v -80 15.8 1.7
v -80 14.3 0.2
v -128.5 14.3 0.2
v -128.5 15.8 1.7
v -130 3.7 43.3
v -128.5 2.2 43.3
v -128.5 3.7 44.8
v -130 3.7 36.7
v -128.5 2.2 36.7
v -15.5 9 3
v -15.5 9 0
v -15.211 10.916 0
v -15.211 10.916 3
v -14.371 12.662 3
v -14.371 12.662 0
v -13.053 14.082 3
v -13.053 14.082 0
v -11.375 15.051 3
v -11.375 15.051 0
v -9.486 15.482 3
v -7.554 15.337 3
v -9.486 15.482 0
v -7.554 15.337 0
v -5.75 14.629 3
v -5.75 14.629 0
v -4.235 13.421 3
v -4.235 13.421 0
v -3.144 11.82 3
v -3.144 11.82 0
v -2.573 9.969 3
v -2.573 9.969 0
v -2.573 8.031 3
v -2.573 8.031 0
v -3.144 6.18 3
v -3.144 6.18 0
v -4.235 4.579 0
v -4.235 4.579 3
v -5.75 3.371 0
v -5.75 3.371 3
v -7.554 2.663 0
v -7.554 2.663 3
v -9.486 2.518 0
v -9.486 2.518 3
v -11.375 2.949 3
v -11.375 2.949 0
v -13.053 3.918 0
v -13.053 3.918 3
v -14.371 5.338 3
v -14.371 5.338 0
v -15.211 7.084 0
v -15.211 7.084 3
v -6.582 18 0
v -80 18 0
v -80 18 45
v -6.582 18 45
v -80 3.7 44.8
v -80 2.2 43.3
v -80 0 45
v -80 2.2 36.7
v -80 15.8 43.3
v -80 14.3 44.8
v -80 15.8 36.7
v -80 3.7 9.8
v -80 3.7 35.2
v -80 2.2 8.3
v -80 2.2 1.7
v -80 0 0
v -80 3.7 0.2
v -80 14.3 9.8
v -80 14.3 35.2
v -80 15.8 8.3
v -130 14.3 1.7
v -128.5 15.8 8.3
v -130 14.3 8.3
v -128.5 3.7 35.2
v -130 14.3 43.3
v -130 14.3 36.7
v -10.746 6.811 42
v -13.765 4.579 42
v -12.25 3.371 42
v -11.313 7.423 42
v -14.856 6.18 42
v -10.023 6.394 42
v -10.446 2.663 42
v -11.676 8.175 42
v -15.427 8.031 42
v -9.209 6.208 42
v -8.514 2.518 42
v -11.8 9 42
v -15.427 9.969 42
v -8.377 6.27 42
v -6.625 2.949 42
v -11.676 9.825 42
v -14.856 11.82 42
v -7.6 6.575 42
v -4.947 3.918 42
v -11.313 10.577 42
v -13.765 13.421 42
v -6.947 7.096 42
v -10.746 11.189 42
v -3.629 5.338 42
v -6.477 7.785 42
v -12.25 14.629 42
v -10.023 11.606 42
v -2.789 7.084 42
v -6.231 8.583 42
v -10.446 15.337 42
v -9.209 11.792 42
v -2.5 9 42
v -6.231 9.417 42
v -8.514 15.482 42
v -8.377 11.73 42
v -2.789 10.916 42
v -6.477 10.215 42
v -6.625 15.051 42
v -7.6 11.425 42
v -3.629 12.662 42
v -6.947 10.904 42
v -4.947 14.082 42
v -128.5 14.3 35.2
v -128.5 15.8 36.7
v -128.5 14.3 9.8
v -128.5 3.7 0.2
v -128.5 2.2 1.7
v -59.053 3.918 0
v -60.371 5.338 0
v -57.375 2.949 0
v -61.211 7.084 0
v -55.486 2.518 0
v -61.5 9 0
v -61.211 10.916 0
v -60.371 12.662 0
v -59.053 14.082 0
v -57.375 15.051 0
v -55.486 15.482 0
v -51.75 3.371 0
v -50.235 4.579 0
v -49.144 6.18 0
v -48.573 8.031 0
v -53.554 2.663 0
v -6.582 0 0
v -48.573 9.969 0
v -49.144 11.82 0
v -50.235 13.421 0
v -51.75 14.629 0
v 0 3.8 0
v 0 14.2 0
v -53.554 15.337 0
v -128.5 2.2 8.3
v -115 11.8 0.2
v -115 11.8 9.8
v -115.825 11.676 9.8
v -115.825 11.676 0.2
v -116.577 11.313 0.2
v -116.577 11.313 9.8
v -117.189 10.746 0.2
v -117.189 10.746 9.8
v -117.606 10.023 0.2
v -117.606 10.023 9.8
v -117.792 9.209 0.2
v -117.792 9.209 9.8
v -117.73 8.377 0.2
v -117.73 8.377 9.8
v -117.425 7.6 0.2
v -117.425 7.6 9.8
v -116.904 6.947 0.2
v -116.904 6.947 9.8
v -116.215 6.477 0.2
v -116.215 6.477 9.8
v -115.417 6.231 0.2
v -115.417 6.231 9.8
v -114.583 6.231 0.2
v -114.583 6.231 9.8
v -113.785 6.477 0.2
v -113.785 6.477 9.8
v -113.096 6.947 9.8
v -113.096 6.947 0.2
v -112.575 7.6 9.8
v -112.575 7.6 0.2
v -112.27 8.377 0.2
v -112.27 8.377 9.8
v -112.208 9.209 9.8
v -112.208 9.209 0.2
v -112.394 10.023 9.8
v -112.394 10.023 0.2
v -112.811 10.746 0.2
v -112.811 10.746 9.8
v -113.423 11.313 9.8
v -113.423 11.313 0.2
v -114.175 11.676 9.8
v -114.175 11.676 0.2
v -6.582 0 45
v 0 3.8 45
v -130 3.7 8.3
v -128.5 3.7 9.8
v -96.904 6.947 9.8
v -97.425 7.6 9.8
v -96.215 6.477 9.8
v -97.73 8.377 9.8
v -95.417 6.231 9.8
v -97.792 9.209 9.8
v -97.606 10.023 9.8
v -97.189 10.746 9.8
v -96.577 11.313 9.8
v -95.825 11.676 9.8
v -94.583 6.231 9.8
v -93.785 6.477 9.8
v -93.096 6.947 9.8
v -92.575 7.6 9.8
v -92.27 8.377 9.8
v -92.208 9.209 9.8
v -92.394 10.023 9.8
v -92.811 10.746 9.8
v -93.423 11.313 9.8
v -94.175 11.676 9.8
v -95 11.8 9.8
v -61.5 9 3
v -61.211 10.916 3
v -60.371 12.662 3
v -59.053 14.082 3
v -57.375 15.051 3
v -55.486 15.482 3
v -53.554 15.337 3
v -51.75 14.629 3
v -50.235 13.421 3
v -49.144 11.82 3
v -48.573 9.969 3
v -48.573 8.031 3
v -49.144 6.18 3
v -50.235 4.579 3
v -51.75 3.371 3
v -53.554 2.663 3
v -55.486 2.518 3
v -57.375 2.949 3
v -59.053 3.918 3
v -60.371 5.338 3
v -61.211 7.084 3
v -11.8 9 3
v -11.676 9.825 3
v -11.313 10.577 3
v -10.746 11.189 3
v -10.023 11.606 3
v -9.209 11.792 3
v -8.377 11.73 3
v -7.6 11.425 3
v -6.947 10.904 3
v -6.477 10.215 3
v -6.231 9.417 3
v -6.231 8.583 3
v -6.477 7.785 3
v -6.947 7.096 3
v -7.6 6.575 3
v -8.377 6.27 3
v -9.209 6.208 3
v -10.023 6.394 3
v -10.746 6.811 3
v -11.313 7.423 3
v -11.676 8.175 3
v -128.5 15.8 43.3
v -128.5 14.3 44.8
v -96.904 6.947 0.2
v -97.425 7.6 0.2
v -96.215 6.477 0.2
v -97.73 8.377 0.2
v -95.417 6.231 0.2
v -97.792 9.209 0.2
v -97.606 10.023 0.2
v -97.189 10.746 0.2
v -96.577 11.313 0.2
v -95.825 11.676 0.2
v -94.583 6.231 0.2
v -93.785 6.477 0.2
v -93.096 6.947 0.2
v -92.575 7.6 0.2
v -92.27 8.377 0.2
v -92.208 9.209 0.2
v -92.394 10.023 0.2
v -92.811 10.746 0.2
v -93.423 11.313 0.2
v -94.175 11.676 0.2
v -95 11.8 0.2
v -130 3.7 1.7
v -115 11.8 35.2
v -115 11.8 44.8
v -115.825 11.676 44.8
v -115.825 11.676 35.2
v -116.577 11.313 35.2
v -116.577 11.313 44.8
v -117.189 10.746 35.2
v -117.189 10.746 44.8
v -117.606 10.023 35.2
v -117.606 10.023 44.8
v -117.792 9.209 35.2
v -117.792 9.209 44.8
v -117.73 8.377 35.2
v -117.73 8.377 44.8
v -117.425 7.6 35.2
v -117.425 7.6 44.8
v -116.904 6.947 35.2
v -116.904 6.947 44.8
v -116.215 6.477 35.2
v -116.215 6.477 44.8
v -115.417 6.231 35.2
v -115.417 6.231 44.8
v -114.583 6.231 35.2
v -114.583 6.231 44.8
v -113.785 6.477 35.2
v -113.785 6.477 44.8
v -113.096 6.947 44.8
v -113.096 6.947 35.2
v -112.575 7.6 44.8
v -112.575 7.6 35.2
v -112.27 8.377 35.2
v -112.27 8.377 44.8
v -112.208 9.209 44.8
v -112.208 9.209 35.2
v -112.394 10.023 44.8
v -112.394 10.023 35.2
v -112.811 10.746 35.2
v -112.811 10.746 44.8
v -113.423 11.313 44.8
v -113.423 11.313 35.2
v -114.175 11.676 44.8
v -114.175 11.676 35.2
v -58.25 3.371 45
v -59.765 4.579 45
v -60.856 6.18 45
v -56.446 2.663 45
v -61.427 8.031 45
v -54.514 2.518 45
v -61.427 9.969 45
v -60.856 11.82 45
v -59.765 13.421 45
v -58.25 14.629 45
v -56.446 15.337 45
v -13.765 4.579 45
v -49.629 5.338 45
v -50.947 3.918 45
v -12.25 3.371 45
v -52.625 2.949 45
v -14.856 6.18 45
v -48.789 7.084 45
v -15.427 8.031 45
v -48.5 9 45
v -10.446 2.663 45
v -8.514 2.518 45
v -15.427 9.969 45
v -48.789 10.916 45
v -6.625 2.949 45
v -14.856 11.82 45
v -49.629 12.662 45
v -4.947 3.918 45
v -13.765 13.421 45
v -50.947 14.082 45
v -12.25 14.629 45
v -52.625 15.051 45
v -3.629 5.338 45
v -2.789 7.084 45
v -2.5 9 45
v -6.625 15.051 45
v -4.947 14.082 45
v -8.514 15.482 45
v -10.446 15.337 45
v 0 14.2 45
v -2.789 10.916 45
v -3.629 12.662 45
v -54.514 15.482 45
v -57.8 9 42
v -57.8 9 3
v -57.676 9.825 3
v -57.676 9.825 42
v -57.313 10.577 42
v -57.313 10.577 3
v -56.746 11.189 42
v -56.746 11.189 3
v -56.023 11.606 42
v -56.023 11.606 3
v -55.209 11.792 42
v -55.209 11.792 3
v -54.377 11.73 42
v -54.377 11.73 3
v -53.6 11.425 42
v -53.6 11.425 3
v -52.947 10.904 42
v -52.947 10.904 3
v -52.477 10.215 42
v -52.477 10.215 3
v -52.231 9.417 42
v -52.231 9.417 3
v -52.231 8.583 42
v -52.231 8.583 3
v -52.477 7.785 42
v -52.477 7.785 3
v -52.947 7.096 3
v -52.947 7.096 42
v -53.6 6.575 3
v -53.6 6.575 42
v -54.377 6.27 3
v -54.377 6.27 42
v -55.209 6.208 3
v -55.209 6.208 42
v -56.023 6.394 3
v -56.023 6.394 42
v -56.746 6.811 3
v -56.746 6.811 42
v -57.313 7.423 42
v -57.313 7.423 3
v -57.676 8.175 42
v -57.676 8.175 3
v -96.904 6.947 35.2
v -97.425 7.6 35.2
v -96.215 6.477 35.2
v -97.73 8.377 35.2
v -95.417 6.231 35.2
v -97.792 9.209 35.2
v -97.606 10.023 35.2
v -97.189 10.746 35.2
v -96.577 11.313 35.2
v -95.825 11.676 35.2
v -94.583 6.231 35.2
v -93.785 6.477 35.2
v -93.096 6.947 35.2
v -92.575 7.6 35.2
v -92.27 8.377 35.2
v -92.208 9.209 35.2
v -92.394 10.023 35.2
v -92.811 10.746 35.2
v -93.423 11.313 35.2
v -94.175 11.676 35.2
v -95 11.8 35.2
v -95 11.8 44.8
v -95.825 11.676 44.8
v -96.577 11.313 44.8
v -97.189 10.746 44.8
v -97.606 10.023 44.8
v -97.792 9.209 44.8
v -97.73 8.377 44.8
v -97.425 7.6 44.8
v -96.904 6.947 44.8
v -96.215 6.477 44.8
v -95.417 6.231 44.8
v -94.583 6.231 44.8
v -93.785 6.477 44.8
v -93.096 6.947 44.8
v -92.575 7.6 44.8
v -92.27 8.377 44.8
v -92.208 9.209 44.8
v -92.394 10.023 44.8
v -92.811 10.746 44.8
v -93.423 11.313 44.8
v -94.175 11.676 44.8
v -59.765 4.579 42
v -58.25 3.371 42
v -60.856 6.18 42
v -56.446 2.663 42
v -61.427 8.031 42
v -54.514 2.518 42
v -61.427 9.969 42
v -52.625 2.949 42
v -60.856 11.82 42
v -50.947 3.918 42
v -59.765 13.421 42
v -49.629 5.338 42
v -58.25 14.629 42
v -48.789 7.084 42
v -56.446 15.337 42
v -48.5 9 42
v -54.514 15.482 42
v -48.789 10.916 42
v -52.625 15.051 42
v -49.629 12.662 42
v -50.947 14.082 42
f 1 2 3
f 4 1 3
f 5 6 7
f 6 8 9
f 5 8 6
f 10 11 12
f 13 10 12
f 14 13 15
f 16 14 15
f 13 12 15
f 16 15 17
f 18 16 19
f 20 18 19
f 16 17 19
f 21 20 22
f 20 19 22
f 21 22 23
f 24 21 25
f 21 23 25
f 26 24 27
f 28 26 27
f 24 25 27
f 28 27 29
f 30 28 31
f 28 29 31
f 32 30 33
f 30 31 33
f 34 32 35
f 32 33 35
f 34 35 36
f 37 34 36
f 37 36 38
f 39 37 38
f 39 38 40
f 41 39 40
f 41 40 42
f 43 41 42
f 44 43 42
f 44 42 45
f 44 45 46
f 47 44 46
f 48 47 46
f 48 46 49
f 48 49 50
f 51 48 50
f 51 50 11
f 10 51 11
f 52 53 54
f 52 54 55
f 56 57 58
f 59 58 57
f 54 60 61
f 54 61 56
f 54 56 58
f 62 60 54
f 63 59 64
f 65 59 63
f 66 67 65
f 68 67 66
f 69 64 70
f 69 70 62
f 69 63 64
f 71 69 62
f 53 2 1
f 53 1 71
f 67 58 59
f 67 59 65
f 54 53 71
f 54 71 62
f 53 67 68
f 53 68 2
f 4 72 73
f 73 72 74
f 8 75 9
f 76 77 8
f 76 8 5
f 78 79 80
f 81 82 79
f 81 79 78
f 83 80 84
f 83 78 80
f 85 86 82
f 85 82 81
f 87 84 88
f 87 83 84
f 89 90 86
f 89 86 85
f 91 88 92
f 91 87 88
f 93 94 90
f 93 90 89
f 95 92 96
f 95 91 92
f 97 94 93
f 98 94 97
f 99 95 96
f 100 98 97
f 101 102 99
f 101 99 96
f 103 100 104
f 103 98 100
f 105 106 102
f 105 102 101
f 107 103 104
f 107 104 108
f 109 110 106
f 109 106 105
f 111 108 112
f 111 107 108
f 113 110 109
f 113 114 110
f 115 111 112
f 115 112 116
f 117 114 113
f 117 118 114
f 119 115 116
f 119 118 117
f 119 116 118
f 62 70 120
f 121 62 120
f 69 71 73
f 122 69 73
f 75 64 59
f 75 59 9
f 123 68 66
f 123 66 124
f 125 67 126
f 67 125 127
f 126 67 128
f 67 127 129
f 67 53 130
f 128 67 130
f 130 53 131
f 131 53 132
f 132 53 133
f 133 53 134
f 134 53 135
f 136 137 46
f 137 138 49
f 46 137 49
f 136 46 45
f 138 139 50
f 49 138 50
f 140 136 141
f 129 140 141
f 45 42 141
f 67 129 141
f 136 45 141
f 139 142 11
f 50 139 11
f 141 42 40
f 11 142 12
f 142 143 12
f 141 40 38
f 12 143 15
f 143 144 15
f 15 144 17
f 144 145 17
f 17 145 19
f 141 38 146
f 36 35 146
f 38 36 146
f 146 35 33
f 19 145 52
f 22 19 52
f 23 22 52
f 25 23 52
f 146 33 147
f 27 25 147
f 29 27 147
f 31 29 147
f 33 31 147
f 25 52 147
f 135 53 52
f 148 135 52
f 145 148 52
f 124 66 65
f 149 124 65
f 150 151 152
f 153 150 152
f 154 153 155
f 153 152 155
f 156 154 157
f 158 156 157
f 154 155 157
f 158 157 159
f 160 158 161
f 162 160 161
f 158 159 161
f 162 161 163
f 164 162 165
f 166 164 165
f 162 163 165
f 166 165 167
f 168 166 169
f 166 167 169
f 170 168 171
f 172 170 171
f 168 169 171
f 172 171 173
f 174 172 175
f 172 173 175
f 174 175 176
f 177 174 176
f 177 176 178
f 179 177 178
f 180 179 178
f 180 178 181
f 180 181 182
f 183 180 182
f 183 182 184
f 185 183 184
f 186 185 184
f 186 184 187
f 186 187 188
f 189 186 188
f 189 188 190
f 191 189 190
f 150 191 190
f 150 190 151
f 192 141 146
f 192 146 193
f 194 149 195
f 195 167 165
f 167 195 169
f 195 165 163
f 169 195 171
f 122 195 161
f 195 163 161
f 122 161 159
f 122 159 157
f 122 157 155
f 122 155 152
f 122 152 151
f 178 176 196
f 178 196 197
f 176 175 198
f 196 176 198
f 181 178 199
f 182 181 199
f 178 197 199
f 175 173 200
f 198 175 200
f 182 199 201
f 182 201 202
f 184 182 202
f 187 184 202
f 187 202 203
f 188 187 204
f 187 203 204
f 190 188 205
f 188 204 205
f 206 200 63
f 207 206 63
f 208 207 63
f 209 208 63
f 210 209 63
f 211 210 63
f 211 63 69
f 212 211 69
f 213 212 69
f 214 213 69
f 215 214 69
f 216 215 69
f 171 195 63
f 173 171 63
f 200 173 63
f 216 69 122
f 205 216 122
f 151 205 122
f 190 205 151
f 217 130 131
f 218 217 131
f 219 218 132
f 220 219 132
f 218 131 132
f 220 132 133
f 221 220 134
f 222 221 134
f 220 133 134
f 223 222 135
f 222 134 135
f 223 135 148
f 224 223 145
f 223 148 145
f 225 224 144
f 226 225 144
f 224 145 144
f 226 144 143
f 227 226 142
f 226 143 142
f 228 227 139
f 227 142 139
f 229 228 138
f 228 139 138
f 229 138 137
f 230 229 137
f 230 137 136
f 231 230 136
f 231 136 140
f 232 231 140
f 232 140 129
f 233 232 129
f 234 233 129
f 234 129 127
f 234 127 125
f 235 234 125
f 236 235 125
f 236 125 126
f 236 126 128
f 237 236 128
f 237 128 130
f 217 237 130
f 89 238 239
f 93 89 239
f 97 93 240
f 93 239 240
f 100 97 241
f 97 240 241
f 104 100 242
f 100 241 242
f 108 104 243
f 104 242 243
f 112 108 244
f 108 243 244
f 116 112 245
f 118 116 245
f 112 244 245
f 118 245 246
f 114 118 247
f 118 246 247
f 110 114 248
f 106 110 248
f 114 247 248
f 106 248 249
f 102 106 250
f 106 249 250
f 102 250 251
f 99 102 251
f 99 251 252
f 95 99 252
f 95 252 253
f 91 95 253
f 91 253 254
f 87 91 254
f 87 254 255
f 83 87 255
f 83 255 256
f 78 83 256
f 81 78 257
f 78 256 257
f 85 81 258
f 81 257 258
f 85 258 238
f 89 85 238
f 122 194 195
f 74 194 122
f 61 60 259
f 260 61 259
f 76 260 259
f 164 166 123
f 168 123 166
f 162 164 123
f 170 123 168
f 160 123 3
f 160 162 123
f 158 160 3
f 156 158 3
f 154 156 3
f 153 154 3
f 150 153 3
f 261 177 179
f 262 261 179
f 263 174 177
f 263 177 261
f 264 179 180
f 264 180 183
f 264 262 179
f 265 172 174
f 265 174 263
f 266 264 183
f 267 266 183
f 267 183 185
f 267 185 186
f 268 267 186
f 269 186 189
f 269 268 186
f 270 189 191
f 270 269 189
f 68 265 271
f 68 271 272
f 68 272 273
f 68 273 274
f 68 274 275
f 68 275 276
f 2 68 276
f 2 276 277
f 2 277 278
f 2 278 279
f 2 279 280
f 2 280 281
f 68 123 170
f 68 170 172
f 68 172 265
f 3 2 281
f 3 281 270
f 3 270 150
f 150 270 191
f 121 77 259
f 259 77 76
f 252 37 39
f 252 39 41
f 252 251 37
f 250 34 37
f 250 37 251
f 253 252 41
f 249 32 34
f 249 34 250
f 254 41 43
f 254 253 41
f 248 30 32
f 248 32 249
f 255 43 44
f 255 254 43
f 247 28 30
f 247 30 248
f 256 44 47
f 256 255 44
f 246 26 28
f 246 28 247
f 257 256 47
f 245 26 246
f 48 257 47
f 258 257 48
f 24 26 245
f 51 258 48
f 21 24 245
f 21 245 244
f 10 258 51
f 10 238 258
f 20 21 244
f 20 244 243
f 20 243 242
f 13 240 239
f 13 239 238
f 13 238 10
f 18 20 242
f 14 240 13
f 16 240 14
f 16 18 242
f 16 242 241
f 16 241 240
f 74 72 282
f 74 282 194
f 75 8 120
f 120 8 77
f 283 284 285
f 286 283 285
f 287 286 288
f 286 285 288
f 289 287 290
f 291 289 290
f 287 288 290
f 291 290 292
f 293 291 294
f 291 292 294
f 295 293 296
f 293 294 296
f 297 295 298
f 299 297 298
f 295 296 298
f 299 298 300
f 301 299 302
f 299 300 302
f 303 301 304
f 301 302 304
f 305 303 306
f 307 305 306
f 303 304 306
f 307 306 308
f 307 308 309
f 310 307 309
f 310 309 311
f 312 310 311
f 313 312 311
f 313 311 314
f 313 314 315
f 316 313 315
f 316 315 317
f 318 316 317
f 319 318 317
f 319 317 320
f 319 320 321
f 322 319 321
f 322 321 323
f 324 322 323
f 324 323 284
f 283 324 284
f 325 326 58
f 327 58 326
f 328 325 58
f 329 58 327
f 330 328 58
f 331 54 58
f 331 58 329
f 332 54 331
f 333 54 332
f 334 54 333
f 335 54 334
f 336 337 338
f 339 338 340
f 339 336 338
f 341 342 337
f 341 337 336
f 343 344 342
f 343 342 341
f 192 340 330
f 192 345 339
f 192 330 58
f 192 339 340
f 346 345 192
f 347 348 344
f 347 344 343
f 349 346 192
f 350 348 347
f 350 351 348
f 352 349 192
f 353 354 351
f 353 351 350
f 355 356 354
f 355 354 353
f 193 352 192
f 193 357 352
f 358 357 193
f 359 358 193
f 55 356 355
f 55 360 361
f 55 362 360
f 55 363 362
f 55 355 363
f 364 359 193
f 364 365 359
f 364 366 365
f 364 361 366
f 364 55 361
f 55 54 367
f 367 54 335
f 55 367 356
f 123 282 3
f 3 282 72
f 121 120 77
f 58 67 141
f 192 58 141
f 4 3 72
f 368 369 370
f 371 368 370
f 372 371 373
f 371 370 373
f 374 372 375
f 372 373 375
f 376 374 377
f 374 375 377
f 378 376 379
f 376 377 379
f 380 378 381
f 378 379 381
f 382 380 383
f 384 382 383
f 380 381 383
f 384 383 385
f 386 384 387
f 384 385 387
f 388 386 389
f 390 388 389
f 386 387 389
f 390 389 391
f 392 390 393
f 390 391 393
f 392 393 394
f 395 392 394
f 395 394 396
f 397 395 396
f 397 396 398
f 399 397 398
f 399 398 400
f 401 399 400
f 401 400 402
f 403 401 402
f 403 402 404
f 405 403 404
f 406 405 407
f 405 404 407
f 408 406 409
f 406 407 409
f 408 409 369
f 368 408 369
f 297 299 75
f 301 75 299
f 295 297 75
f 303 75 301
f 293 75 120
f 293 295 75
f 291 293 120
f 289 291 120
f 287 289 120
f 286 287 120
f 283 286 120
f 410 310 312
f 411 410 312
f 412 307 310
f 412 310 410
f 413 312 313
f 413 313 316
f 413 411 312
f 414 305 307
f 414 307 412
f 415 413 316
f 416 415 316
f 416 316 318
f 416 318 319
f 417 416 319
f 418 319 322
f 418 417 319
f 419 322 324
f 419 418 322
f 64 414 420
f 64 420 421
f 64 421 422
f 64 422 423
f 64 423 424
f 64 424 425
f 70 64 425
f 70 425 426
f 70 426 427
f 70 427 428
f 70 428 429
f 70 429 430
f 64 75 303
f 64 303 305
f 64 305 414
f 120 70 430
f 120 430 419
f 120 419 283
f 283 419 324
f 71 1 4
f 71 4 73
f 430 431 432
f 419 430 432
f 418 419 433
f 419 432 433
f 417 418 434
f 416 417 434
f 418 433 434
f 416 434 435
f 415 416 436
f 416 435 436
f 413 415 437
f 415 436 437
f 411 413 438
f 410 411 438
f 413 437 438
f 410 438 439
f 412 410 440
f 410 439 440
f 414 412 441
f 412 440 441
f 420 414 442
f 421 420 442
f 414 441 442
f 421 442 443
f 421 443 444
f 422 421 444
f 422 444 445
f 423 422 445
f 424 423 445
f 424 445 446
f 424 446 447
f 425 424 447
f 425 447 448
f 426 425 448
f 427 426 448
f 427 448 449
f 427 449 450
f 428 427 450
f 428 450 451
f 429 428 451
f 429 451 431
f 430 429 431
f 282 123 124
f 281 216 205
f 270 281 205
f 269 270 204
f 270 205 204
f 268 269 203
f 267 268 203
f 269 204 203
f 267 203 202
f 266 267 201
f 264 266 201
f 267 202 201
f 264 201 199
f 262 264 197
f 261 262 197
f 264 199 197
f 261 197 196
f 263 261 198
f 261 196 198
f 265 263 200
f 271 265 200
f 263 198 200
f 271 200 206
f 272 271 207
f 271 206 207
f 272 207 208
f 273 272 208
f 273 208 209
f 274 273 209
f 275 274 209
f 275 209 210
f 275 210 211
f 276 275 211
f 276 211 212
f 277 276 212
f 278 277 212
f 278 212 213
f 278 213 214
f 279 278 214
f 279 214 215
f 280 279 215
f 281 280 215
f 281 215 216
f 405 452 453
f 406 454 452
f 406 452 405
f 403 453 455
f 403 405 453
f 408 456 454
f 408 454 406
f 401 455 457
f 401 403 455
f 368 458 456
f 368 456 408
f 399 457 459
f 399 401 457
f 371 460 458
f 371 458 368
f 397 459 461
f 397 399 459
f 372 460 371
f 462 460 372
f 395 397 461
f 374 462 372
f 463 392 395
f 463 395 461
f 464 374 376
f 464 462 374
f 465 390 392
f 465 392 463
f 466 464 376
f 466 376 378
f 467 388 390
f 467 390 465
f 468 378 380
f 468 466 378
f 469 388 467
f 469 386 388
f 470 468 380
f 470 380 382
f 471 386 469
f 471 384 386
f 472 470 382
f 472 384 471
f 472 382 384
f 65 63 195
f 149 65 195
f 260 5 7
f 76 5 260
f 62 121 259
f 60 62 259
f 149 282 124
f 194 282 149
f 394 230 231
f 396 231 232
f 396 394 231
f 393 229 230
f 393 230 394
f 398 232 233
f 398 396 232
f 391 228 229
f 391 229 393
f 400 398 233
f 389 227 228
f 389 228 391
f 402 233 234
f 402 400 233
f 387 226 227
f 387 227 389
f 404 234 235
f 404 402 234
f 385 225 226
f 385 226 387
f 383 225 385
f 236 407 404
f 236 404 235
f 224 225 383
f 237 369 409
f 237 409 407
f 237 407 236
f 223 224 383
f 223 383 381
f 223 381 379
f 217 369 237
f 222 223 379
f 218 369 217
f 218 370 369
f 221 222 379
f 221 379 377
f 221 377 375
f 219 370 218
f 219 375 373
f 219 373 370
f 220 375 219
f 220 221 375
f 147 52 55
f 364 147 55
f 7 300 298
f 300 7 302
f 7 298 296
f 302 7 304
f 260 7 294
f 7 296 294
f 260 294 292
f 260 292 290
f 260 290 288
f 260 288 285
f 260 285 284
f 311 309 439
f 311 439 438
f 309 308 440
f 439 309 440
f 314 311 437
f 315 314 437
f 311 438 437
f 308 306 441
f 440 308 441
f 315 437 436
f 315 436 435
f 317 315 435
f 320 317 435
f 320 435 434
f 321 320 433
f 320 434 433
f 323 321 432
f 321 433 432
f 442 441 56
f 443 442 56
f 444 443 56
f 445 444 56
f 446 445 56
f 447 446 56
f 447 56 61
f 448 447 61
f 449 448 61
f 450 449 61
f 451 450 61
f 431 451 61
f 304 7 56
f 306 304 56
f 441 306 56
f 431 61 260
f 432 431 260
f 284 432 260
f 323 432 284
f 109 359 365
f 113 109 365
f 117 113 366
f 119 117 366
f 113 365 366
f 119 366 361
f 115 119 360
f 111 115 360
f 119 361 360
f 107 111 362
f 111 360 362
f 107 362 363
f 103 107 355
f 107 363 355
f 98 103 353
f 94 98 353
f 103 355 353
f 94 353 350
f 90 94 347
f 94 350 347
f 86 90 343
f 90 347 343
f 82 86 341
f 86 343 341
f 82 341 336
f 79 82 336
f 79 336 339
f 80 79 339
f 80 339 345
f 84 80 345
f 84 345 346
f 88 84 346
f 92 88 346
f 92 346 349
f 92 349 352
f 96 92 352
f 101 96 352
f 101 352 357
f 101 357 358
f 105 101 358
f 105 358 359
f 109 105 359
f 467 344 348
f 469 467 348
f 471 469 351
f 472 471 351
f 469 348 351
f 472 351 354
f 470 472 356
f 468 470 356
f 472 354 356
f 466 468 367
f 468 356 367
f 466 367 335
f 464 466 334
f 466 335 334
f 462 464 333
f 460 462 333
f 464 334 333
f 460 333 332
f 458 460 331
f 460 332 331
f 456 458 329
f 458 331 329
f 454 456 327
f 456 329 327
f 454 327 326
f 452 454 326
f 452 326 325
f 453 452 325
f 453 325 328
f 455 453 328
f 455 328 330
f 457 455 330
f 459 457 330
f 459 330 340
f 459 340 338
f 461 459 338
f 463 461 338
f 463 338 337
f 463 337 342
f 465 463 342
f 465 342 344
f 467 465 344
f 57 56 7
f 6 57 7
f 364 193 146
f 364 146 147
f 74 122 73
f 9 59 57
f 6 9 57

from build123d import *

# Parameters (mm, degrees)
SCHIZZO1_W                                           = 80
SCHIZZO1_H                                           = 18
ESTRUSIONE_ESTRUSIONE1_DEPTH                         = 45
SMUSSO1_SIZE                                         = 3.8
SMUSSO1_SIZE2                                        = 6.581793069
SMUSSO2_SIZE                                         = 3.8
SMUSSO2_SIZE2                                        = 6.581793069
SCHIZZO2_W                                           = 9.6
SCHIZZO2_H                                           = 13.6
ESTRUSIONE_ESTRUSIONE2_DEPTH                         = 50
SMUSSO3_SIZE                                         = 1.5
FORO_PER_VITE_M4_1_D                                 = 5.6
FORO_PER_VITE_M4_1_DEPTH                             = 50
FORO_PER_VITE_M4_1_TIP                               = 1.682409733
FORO_LAMATO_PER_BULLONE_M5_A_TESTA_ESAGO_D           = 5.6
FORO_LAMATO_PER_BULLONE_M5_A_TESTA_ESAGO_DEPTH       = 50
FORO_LAMATO_PER_BULLONE_M5_A_TESTA_ESAGO_CBORE_D     = 13
FORO_LAMATO_PER_BULLONE_M5_A_TESTA_ESAGO_CBORE_DEPTH = 3
FORO_LAMATO_PER_BULLONE_M5_A_TESTA_ESAGO_TIP         = 1.682409733
FORO_LAMATO_PER_BULLONE_M5_A_TESTA_E_2_D             = 5.6
FORO_LAMATO_PER_BULLONE_M5_A_TESTA_E_2_DEPTH         = 50
FORO_LAMATO_PER_BULLONE_M5_A_TESTA_E_2_CBORE_D       = 13
FORO_LAMATO_PER_BULLONE_M5_A_TESTA_E_2_CBORE_DEPTH   = 3
FORO_LAMATO_PER_BULLONE_M5_A_TESTA_E_2_TIP           = 1.682409733


with BuildPart() as part:
    # Schizzo1 → Estrusione-Estrusione1 (new body)
    with BuildSketch(Plane.XY):
        with Locations((-40, 9)):
            Rectangle(SCHIZZO1_W, SCHIZZO1_H)
    extrude(amount=ESTRUSIONE_ESTRUSIONE1_DEPTH)

    # Smusso1
    smusso1_edges = [part.edges().sort_by_distance(p)[0] for p in [
        (0, 18, 22.5),
    ]]
    smusso1_side = [part.faces().sort_by_distance(p)[0] for p in [
        (0, 9, 22.5),
    ]]
    chamfer(smusso1_edges, length=SMUSSO1_SIZE, length2=SMUSSO1_SIZE2, reference=smusso1_side[0])

    # Smusso2
    smusso2_edges = [part.edges().sort_by_distance(p)[0] for p in [
        (0, 0, 22.5),
    ]]
    smusso2_side = [part.faces().sort_by_distance(p)[0] for p in [
        (0, 7.1, 22.5),
    ]]
    chamfer(smusso2_edges, length=SMUSSO2_SIZE, length2=SMUSSO2_SIZE2, reference=smusso2_side[0])

    # Schizzo2 → Estrusione-Estrusione2 (add)
    with BuildSketch(Plane.ZY.offset(80)):
        with Locations((5, 9)):
            Rectangle(SCHIZZO2_W, SCHIZZO2_H)
        with Locations((40, 9)):
            Rectangle(SCHIZZO2_W, SCHIZZO2_H)
    extrude(amount=ESTRUSIONE_ESTRUSIONE2_DEPTH)

    # Smusso3
    smusso3_edges = [part.edges().sort_by_distance(p)[0] for p in [
        (-105, 15.8, 0.2),
        (-105, 2.2, 0.2),
        (-105, 2.2, 9.8),
        (-105, 15.8, 9.8),
        (-130, 9, 0.2),
        (-130, 2.2, 5),
        (-130, 9, 9.8),
        (-130, 15.8, 5),
        (-105, 15.8, 35.2),
        (-105, 2.2, 35.2),
        (-105, 2.2, 44.8),
        (-105, 15.8, 44.8),
        (-130, 9, 35.2),
        (-130, 2.2, 40),
        (-130, 9, 44.8),
        (-130, 15.8, 40),
    ]]
    chamfer(smusso3_edges, length=SMUSSO3_SIZE)

    # Foro per Vite M4-1
    with Locations(Plane(origin=(-115, 9, 0.2), x_dir=(0, -1, 0), z_dir=(0, 0, -1))):
        with Locations((0, 0), (0, -20)):
            Hole(FORO_PER_VITE_M4_1_D / 2, depth=FORO_PER_VITE_M4_1_DEPTH)
            with Locations((0, 0, -(FORO_PER_VITE_M4_1_DEPTH + FORO_PER_VITE_M4_1_TIP / 2))):  # 118° drill point
                Cone(0, FORO_PER_VITE_M4_1_D / 2, FORO_PER_VITE_M4_1_TIP, mode=Mode.SUBTRACT)

    # Foro lamato per Bullone M5 a testa esago
    with Locations(Plane.XY.offset(45)):
        with Locations((-9, 9), (-55, 9)):
            CounterBoreHole(FORO_LAMATO_PER_BULLONE_M5_A_TESTA_ESAGO_D / 2, FORO_LAMATO_PER_BULLONE_M5_A_TESTA_ESAGO_CBORE_D / 2, FORO_LAMATO_PER_BULLONE_M5_A_TESTA_ESAGO_CBORE_DEPTH, depth=FORO_LAMATO_PER_BULLONE_M5_A_TESTA_ESAGO_DEPTH)
            with Locations((0, 0, -(FORO_LAMATO_PER_BULLONE_M5_A_TESTA_ESAGO_DEPTH + FORO_LAMATO_PER_BULLONE_M5_A_TESTA_ESAGO_TIP / 2))):  # 118° drill point
                Cone(0, FORO_LAMATO_PER_BULLONE_M5_A_TESTA_ESAGO_D / 2, FORO_LAMATO_PER_BULLONE_M5_A_TESTA_ESAGO_TIP, mode=Mode.SUBTRACT)

    # Foro lamato per Bullone M5 a testa e 2
    with Locations(Plane(origin=(-9, 9, 0), x_dir=(-1, 0, 0), z_dir=(0, 0, -1))):
        with Locations((0, 0), (46, 0)):
            CounterBoreHole(FORO_LAMATO_PER_BULLONE_M5_A_TESTA_E_2_D / 2, FORO_LAMATO_PER_BULLONE_M5_A_TESTA_E_2_CBORE_D / 2, FORO_LAMATO_PER_BULLONE_M5_A_TESTA_E_2_CBORE_DEPTH, depth=FORO_LAMATO_PER_BULLONE_M5_A_TESTA_E_2_DEPTH)
            with Locations((0, 0, -(FORO_LAMATO_PER_BULLONE_M5_A_TESTA_E_2_DEPTH + FORO_LAMATO_PER_BULLONE_M5_A_TESTA_E_2_TIP / 2))):  # 118° drill point
                Cone(0, FORO_LAMATO_PER_BULLONE_M5_A_TESTA_E_2_D / 2, FORO_LAMATO_PER_BULLONE_M5_A_TESTA_E_2_TIP, mode=Mode.SUBTRACT)


solid = part.part
